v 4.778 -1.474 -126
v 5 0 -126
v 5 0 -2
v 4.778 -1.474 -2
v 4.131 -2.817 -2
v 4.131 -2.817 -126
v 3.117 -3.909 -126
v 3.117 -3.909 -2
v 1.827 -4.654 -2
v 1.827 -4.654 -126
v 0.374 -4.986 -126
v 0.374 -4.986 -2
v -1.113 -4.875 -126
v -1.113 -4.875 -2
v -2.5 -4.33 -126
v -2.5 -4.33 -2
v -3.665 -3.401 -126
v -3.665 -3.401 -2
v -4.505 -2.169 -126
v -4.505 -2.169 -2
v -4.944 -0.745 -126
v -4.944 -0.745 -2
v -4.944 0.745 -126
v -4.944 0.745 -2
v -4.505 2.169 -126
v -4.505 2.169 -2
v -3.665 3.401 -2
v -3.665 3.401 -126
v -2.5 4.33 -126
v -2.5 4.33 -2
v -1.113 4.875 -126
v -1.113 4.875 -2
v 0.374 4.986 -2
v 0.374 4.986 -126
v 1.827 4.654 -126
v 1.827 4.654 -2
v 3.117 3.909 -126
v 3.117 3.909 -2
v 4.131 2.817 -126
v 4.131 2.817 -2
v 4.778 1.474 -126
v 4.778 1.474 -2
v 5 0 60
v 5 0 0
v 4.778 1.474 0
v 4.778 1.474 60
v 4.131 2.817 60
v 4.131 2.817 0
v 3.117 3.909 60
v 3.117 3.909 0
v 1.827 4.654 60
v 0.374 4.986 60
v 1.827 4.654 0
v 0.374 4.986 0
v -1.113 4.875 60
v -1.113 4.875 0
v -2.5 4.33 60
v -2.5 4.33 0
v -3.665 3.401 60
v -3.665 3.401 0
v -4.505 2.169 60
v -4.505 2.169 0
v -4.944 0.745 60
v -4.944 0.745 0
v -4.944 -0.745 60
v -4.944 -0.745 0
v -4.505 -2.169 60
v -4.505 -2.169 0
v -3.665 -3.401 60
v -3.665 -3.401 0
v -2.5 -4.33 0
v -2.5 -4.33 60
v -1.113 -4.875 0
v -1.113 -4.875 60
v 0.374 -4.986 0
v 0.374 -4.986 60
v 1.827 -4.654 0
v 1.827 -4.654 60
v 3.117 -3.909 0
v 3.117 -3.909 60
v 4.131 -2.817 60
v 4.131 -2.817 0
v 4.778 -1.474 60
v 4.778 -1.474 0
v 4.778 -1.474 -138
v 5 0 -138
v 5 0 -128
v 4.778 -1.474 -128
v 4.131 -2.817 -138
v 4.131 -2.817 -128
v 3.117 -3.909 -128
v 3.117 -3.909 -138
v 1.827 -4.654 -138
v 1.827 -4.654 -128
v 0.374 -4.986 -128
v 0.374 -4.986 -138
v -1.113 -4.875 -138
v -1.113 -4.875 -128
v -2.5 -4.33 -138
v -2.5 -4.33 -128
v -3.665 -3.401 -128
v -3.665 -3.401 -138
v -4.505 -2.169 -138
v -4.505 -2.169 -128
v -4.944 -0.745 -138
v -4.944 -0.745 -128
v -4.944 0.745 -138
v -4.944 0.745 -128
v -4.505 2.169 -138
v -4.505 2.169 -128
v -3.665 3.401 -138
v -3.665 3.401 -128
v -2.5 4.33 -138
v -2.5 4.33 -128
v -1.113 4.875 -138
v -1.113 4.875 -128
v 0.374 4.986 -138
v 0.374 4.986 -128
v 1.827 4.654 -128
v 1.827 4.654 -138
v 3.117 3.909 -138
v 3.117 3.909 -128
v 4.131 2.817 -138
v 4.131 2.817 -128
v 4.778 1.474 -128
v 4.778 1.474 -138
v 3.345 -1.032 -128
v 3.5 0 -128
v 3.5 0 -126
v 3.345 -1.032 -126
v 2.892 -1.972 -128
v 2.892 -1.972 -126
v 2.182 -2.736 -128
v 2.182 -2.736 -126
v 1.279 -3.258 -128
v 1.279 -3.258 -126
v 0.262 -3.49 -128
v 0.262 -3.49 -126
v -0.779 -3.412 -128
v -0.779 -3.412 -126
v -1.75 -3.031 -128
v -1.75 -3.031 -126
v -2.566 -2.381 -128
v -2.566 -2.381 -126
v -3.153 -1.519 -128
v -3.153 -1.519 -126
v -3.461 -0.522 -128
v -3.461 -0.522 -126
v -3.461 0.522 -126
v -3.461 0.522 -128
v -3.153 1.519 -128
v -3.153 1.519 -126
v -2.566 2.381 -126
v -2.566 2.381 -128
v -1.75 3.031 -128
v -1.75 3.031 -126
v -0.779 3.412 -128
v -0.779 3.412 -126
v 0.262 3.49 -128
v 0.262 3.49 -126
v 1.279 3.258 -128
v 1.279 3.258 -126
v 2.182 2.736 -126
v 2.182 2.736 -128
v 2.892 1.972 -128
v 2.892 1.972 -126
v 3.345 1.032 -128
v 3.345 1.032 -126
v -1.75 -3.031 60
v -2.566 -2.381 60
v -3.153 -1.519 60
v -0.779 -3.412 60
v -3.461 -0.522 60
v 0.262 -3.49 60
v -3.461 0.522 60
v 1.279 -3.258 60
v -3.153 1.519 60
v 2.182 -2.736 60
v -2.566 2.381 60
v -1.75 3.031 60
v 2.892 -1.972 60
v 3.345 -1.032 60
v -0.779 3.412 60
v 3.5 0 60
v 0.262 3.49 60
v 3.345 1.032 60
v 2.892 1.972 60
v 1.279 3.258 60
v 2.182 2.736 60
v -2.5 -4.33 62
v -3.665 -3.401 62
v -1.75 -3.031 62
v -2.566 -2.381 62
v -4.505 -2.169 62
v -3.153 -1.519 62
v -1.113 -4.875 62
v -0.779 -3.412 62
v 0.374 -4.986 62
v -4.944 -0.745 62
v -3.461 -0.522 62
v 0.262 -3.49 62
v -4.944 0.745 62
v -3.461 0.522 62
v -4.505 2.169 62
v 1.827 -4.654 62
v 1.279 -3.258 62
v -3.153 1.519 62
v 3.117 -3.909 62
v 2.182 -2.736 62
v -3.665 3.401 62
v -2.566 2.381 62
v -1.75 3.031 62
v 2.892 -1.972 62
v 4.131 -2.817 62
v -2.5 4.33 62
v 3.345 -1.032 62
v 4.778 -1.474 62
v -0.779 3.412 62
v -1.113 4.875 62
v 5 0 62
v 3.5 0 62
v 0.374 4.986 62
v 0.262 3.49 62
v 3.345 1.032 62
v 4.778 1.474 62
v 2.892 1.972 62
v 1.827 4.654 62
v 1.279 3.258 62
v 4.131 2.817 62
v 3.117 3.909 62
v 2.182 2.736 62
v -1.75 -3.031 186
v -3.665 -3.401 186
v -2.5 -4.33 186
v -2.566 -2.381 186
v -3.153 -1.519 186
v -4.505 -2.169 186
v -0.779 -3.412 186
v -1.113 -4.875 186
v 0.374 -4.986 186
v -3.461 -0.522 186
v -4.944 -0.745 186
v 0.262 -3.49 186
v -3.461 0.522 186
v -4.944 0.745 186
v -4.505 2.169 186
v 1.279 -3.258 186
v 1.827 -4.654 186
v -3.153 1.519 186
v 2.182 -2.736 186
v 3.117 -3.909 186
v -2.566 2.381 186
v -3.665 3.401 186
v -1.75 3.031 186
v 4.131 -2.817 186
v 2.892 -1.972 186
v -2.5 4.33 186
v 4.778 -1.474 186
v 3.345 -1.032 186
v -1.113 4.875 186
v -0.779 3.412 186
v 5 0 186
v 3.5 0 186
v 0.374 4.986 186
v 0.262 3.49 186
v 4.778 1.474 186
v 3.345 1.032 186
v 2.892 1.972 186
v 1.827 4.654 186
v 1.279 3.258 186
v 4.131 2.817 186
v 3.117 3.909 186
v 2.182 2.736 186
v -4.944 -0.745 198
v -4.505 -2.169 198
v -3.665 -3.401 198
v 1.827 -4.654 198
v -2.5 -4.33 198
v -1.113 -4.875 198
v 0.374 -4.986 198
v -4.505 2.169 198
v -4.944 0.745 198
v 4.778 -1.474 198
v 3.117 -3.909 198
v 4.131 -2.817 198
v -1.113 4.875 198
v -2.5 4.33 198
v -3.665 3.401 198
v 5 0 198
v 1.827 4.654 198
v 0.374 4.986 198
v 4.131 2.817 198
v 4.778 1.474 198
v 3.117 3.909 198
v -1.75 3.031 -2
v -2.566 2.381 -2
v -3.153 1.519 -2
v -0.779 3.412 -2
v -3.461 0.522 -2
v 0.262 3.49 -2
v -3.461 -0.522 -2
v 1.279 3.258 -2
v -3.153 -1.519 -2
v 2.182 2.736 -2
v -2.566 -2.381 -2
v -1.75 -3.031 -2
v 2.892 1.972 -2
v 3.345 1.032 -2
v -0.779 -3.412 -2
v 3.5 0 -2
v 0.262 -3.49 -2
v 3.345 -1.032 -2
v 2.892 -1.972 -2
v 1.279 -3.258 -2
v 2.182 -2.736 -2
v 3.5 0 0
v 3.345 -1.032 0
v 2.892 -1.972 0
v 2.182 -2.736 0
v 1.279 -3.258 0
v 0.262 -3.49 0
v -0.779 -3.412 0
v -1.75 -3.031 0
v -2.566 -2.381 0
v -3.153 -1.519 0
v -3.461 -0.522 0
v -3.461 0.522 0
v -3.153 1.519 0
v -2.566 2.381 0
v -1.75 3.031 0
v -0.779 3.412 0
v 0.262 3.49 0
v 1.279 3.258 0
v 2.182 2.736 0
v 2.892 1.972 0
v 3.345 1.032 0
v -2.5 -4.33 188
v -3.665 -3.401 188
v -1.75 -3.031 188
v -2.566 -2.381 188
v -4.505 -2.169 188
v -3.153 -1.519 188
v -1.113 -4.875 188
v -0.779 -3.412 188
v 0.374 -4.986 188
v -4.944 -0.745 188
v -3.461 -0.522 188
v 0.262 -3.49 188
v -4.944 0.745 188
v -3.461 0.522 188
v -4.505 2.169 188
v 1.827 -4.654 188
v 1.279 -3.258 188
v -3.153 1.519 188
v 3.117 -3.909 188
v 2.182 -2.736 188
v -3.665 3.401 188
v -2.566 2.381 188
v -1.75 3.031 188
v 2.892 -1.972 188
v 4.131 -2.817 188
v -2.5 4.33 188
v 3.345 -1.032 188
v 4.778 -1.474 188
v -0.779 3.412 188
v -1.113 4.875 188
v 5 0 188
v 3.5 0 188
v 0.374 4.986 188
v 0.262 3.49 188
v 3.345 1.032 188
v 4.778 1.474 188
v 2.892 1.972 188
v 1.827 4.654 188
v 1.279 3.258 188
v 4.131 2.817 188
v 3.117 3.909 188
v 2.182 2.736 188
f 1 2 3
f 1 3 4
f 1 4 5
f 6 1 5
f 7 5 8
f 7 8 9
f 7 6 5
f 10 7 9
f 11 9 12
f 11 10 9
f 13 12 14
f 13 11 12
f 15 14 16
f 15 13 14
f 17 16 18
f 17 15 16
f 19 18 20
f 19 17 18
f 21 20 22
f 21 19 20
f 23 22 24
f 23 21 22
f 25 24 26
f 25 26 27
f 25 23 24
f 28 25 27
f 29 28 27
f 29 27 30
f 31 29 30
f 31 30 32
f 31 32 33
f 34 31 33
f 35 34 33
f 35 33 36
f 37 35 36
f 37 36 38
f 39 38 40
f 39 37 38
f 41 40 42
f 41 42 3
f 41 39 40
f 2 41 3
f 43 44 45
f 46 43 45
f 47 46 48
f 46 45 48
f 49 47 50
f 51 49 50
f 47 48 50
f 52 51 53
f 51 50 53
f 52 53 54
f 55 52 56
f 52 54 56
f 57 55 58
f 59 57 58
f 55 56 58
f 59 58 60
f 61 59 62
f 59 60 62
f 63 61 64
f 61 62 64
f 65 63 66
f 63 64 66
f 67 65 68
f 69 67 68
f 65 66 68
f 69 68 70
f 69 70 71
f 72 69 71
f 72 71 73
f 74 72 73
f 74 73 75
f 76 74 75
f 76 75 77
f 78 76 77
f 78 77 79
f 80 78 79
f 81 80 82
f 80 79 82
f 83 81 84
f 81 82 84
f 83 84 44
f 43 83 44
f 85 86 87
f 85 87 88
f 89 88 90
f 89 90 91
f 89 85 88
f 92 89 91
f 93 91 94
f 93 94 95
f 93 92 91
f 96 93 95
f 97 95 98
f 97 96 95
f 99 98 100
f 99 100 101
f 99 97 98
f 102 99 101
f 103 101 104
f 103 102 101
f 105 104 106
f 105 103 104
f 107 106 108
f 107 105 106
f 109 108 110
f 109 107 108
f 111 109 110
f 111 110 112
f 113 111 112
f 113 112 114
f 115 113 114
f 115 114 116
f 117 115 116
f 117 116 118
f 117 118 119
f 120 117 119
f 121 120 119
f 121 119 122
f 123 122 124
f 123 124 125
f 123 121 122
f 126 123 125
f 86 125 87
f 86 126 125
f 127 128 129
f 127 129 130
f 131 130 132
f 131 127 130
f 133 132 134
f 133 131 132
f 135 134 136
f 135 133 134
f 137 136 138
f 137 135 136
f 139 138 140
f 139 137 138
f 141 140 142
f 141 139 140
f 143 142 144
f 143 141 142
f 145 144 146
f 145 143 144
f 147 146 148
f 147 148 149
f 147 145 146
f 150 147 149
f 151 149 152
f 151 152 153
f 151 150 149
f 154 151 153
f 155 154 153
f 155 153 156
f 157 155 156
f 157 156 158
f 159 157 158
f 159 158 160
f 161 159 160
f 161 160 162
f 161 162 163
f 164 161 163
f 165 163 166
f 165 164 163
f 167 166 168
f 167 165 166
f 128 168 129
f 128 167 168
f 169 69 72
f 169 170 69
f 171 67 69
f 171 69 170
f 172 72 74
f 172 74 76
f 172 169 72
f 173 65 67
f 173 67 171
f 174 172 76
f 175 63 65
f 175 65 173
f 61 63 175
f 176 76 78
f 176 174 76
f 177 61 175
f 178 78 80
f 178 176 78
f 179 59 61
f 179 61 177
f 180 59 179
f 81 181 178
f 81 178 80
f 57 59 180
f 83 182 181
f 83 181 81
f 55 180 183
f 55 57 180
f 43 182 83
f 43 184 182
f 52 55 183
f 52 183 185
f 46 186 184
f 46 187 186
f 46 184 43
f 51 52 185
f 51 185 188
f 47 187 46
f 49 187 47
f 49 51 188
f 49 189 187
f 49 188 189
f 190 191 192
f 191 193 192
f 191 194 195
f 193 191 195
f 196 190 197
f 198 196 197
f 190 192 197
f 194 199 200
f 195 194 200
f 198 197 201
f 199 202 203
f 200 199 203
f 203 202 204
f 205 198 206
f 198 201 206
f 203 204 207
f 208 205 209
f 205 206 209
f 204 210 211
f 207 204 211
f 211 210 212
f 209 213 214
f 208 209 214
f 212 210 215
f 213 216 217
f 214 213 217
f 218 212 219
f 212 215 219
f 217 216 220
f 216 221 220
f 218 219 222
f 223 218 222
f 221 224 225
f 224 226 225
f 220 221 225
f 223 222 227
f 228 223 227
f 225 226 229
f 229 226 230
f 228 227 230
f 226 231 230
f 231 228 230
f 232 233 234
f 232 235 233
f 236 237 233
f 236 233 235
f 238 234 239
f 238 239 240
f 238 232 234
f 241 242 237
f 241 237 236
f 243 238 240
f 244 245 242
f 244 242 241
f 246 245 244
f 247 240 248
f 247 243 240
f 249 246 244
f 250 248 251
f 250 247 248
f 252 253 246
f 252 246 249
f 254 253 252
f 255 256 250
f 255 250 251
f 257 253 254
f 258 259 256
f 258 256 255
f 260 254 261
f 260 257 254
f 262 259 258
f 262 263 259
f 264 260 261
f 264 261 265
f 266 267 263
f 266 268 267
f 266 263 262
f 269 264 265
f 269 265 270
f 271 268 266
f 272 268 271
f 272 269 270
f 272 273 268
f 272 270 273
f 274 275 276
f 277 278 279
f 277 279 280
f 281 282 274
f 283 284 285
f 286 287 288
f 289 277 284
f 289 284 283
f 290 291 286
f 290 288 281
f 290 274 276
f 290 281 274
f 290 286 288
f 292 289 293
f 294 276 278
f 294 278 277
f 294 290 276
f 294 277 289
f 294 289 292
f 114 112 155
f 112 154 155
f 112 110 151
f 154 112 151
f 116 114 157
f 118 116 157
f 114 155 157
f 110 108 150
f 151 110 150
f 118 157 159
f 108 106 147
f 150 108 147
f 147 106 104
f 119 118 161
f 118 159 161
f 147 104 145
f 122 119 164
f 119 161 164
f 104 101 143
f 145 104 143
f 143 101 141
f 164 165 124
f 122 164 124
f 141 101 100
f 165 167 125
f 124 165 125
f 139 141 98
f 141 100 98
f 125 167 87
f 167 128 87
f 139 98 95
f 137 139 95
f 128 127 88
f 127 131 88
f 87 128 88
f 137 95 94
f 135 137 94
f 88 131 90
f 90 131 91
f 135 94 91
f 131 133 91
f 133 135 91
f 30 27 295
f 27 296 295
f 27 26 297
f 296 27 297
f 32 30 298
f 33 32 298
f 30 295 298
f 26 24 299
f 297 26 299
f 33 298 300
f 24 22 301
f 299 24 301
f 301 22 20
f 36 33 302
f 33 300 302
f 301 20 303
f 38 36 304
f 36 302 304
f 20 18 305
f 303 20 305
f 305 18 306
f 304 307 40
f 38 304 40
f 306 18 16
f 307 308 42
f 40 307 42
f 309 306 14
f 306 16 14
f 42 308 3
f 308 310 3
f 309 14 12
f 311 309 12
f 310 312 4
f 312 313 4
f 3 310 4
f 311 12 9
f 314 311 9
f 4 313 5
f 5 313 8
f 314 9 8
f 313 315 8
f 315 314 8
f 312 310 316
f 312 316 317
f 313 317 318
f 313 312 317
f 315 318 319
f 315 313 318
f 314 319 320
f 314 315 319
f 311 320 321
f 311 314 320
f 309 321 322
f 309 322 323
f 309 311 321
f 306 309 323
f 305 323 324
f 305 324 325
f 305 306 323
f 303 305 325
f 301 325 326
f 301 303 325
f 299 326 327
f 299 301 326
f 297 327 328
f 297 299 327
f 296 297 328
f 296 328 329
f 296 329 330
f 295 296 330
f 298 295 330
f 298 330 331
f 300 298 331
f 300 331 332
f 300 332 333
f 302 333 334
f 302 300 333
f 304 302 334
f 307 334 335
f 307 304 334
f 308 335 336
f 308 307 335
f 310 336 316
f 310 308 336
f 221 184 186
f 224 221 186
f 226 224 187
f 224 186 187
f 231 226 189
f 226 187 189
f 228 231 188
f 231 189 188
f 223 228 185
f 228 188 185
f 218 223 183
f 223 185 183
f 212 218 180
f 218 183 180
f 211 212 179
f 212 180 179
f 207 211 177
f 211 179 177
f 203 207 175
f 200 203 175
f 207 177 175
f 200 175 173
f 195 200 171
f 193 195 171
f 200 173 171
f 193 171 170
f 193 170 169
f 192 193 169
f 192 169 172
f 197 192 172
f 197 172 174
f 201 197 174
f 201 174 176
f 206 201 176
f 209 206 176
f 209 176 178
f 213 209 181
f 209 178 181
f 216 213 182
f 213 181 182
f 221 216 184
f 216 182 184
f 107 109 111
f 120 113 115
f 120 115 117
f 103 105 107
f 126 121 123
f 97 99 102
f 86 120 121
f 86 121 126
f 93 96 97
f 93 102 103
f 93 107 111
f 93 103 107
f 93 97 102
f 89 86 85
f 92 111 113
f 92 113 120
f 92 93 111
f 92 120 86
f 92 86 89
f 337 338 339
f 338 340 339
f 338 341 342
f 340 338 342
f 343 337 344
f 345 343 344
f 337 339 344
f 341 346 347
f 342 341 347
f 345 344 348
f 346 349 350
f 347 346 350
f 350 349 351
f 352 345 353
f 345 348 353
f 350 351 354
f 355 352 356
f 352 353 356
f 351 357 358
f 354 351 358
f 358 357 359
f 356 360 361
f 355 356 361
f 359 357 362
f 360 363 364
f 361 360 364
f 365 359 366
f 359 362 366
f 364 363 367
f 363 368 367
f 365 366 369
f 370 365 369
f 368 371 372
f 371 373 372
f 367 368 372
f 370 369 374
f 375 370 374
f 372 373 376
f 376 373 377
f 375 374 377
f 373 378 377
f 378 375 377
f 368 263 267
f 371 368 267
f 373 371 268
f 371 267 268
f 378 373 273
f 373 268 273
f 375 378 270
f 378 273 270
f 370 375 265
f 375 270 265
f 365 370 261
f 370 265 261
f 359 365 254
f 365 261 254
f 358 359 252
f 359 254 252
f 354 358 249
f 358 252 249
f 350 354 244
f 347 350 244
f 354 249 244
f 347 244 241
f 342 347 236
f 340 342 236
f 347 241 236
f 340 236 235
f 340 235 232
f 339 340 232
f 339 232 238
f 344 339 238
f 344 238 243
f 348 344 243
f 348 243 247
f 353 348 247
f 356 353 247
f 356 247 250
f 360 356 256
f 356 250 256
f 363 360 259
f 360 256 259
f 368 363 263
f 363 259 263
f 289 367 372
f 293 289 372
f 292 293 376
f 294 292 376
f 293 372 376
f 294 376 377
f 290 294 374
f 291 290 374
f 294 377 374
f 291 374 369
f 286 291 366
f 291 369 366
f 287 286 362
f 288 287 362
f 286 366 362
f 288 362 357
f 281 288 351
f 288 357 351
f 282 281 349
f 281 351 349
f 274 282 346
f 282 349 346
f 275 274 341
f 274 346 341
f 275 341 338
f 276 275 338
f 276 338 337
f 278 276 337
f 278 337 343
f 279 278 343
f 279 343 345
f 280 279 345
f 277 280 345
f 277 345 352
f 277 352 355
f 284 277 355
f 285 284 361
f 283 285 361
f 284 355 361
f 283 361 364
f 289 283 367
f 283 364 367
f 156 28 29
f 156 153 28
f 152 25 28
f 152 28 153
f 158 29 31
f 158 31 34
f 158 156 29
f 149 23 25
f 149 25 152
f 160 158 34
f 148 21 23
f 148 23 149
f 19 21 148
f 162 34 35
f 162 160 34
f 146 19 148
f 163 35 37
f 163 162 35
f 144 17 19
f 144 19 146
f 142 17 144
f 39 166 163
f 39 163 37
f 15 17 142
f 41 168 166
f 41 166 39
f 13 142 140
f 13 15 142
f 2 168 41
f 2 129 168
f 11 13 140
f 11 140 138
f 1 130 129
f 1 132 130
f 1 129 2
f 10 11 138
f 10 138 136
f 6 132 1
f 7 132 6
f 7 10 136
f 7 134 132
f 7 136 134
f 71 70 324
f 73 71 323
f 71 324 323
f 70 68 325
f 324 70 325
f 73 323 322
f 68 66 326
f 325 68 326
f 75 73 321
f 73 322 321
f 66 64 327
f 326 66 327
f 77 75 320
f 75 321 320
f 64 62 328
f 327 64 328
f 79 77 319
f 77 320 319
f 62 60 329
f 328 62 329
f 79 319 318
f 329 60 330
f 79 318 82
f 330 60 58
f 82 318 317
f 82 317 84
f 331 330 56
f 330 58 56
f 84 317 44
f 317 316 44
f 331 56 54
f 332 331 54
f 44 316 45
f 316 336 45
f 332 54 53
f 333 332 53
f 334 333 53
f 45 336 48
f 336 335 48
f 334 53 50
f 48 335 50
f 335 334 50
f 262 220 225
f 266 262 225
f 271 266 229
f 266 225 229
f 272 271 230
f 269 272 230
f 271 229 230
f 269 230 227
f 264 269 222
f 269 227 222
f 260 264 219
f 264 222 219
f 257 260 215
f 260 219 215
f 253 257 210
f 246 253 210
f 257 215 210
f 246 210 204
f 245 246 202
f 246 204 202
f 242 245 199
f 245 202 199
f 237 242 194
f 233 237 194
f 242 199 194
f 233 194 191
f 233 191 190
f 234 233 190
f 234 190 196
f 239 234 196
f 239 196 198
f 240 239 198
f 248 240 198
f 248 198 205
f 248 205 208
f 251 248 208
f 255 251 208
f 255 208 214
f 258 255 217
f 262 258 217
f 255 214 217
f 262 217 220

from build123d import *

# Parameters (mm, degrees)
SKETCH_1_R      = 5
EXTRUDE_1_DEPTH = 60
SKETCH_2_R      = 3.5
EXTRUDE_2_DEPTH = 2
EXTRUDE_START   = 2
SKETCH_3_R      = 3.5
EXTRUDE_3_DEPTH = 2
EXTRUDE_START_2 = 124
SKETCH_4_R      = 5
EXTRUDE_4_DEPTH = 124
SKETCH_5_R      = 5
EXTRUDE_5_DEPTH = 124
SKETCH_6_R      = 3.5
EXTRUDE_6_DEPTH = 2
SKETCH_7_R      = 5
EXTRUDE_7_DEPTH = 10
SKETCH_8_R      = 3.5
EXTRUDE_8_DEPTH = 2
EXTRUDE_START_3 = 10
SKETCH_9_R      = 5
EXTRUDE_9_DEPTH = 10


with BuildPart() as part:
    # 草图1 → 凸台-拉伸1 (new body)
    with BuildSketch(Plane.XY):
        Circle(SKETCH_1_R)
    extrude(amount=EXTRUDE_1_DEPTH)

    # 草图2 → 凸台-拉伸2 (add)
    with BuildSketch(Plane.XY.offset(60)):
        Circle(SKETCH_2_R)
    extrude(amount=EXTRUDE_2_DEPTH)

    # 草图3 → 凸台-拉伸3 (add)
    with BuildSketch(Plane(origin=(0, 0, 0), x_dir=(-1, 0, 0), z_dir=(0, 0, -1)).offset(EXTRUDE_START)):
        with Locations(Location((0, 0, 0), (0, 0, 180))):
            Circle(SKETCH_3_R)
    extrude(amount=-EXTRUDE_3_DEPTH)

    # 草图4 → 凸台-拉伸4 (add)
    with BuildSketch(Plane(origin=(0, 0, -2), x_dir=(-1, 0, 0), z_dir=(0, 0, -1)).offset(EXTRUDE_START_2)):
        with Locations(Location((0, 0, 0), (0, 0, 180))):
            Circle(SKETCH_4_R)
    extrude(amount=-EXTRUDE_4_DEPTH)

    # 草图5 → 凸台-拉伸5 (add)
    with BuildSketch(Plane.XY.offset(62)):
        Circle(SKETCH_5_R)
    extrude(amount=EXTRUDE_5_DEPTH)

    # 草图6 → 凸台-拉伸6 (add)
    with BuildSketch(Plane.XY.offset(186)):
        Circle(SKETCH_6_R)
    extrude(amount=EXTRUDE_6_DEPTH)

    # 草图7 → 凸台-拉伸7 (add)
    with BuildSketch(Plane.XY.offset(188)):
        Circle(SKETCH_7_R)
    extrude(amount=EXTRUDE_7_DEPTH)

    # 草图8 → 凸台-拉伸8 (add)
    with BuildSketch(Plane(origin=(0, 0, -126), x_dir=(-1, 0, 0), z_dir=(0, 0, -1)).offset(EXTRUDE_START)):
        with Locations(Location((0, 0, 0), (0, 0, 180))):
            Circle(SKETCH_8_R)
    extrude(amount=-EXTRUDE_8_DEPTH)

    # 草图9 → 凸台-拉伸9 (add)
    with BuildSketch(Plane(origin=(0, 0, -128), x_dir=(-1, 0, 0), z_dir=(0, 0, -1)).offset(EXTRUDE_START_3)):
        with Locations(Location((0, 0, 0), (0, 0, 180))):
            Circle(SKETCH_9_R)
    extrude(amount=-EXTRUDE_9_DEPTH)


solid = part.part
